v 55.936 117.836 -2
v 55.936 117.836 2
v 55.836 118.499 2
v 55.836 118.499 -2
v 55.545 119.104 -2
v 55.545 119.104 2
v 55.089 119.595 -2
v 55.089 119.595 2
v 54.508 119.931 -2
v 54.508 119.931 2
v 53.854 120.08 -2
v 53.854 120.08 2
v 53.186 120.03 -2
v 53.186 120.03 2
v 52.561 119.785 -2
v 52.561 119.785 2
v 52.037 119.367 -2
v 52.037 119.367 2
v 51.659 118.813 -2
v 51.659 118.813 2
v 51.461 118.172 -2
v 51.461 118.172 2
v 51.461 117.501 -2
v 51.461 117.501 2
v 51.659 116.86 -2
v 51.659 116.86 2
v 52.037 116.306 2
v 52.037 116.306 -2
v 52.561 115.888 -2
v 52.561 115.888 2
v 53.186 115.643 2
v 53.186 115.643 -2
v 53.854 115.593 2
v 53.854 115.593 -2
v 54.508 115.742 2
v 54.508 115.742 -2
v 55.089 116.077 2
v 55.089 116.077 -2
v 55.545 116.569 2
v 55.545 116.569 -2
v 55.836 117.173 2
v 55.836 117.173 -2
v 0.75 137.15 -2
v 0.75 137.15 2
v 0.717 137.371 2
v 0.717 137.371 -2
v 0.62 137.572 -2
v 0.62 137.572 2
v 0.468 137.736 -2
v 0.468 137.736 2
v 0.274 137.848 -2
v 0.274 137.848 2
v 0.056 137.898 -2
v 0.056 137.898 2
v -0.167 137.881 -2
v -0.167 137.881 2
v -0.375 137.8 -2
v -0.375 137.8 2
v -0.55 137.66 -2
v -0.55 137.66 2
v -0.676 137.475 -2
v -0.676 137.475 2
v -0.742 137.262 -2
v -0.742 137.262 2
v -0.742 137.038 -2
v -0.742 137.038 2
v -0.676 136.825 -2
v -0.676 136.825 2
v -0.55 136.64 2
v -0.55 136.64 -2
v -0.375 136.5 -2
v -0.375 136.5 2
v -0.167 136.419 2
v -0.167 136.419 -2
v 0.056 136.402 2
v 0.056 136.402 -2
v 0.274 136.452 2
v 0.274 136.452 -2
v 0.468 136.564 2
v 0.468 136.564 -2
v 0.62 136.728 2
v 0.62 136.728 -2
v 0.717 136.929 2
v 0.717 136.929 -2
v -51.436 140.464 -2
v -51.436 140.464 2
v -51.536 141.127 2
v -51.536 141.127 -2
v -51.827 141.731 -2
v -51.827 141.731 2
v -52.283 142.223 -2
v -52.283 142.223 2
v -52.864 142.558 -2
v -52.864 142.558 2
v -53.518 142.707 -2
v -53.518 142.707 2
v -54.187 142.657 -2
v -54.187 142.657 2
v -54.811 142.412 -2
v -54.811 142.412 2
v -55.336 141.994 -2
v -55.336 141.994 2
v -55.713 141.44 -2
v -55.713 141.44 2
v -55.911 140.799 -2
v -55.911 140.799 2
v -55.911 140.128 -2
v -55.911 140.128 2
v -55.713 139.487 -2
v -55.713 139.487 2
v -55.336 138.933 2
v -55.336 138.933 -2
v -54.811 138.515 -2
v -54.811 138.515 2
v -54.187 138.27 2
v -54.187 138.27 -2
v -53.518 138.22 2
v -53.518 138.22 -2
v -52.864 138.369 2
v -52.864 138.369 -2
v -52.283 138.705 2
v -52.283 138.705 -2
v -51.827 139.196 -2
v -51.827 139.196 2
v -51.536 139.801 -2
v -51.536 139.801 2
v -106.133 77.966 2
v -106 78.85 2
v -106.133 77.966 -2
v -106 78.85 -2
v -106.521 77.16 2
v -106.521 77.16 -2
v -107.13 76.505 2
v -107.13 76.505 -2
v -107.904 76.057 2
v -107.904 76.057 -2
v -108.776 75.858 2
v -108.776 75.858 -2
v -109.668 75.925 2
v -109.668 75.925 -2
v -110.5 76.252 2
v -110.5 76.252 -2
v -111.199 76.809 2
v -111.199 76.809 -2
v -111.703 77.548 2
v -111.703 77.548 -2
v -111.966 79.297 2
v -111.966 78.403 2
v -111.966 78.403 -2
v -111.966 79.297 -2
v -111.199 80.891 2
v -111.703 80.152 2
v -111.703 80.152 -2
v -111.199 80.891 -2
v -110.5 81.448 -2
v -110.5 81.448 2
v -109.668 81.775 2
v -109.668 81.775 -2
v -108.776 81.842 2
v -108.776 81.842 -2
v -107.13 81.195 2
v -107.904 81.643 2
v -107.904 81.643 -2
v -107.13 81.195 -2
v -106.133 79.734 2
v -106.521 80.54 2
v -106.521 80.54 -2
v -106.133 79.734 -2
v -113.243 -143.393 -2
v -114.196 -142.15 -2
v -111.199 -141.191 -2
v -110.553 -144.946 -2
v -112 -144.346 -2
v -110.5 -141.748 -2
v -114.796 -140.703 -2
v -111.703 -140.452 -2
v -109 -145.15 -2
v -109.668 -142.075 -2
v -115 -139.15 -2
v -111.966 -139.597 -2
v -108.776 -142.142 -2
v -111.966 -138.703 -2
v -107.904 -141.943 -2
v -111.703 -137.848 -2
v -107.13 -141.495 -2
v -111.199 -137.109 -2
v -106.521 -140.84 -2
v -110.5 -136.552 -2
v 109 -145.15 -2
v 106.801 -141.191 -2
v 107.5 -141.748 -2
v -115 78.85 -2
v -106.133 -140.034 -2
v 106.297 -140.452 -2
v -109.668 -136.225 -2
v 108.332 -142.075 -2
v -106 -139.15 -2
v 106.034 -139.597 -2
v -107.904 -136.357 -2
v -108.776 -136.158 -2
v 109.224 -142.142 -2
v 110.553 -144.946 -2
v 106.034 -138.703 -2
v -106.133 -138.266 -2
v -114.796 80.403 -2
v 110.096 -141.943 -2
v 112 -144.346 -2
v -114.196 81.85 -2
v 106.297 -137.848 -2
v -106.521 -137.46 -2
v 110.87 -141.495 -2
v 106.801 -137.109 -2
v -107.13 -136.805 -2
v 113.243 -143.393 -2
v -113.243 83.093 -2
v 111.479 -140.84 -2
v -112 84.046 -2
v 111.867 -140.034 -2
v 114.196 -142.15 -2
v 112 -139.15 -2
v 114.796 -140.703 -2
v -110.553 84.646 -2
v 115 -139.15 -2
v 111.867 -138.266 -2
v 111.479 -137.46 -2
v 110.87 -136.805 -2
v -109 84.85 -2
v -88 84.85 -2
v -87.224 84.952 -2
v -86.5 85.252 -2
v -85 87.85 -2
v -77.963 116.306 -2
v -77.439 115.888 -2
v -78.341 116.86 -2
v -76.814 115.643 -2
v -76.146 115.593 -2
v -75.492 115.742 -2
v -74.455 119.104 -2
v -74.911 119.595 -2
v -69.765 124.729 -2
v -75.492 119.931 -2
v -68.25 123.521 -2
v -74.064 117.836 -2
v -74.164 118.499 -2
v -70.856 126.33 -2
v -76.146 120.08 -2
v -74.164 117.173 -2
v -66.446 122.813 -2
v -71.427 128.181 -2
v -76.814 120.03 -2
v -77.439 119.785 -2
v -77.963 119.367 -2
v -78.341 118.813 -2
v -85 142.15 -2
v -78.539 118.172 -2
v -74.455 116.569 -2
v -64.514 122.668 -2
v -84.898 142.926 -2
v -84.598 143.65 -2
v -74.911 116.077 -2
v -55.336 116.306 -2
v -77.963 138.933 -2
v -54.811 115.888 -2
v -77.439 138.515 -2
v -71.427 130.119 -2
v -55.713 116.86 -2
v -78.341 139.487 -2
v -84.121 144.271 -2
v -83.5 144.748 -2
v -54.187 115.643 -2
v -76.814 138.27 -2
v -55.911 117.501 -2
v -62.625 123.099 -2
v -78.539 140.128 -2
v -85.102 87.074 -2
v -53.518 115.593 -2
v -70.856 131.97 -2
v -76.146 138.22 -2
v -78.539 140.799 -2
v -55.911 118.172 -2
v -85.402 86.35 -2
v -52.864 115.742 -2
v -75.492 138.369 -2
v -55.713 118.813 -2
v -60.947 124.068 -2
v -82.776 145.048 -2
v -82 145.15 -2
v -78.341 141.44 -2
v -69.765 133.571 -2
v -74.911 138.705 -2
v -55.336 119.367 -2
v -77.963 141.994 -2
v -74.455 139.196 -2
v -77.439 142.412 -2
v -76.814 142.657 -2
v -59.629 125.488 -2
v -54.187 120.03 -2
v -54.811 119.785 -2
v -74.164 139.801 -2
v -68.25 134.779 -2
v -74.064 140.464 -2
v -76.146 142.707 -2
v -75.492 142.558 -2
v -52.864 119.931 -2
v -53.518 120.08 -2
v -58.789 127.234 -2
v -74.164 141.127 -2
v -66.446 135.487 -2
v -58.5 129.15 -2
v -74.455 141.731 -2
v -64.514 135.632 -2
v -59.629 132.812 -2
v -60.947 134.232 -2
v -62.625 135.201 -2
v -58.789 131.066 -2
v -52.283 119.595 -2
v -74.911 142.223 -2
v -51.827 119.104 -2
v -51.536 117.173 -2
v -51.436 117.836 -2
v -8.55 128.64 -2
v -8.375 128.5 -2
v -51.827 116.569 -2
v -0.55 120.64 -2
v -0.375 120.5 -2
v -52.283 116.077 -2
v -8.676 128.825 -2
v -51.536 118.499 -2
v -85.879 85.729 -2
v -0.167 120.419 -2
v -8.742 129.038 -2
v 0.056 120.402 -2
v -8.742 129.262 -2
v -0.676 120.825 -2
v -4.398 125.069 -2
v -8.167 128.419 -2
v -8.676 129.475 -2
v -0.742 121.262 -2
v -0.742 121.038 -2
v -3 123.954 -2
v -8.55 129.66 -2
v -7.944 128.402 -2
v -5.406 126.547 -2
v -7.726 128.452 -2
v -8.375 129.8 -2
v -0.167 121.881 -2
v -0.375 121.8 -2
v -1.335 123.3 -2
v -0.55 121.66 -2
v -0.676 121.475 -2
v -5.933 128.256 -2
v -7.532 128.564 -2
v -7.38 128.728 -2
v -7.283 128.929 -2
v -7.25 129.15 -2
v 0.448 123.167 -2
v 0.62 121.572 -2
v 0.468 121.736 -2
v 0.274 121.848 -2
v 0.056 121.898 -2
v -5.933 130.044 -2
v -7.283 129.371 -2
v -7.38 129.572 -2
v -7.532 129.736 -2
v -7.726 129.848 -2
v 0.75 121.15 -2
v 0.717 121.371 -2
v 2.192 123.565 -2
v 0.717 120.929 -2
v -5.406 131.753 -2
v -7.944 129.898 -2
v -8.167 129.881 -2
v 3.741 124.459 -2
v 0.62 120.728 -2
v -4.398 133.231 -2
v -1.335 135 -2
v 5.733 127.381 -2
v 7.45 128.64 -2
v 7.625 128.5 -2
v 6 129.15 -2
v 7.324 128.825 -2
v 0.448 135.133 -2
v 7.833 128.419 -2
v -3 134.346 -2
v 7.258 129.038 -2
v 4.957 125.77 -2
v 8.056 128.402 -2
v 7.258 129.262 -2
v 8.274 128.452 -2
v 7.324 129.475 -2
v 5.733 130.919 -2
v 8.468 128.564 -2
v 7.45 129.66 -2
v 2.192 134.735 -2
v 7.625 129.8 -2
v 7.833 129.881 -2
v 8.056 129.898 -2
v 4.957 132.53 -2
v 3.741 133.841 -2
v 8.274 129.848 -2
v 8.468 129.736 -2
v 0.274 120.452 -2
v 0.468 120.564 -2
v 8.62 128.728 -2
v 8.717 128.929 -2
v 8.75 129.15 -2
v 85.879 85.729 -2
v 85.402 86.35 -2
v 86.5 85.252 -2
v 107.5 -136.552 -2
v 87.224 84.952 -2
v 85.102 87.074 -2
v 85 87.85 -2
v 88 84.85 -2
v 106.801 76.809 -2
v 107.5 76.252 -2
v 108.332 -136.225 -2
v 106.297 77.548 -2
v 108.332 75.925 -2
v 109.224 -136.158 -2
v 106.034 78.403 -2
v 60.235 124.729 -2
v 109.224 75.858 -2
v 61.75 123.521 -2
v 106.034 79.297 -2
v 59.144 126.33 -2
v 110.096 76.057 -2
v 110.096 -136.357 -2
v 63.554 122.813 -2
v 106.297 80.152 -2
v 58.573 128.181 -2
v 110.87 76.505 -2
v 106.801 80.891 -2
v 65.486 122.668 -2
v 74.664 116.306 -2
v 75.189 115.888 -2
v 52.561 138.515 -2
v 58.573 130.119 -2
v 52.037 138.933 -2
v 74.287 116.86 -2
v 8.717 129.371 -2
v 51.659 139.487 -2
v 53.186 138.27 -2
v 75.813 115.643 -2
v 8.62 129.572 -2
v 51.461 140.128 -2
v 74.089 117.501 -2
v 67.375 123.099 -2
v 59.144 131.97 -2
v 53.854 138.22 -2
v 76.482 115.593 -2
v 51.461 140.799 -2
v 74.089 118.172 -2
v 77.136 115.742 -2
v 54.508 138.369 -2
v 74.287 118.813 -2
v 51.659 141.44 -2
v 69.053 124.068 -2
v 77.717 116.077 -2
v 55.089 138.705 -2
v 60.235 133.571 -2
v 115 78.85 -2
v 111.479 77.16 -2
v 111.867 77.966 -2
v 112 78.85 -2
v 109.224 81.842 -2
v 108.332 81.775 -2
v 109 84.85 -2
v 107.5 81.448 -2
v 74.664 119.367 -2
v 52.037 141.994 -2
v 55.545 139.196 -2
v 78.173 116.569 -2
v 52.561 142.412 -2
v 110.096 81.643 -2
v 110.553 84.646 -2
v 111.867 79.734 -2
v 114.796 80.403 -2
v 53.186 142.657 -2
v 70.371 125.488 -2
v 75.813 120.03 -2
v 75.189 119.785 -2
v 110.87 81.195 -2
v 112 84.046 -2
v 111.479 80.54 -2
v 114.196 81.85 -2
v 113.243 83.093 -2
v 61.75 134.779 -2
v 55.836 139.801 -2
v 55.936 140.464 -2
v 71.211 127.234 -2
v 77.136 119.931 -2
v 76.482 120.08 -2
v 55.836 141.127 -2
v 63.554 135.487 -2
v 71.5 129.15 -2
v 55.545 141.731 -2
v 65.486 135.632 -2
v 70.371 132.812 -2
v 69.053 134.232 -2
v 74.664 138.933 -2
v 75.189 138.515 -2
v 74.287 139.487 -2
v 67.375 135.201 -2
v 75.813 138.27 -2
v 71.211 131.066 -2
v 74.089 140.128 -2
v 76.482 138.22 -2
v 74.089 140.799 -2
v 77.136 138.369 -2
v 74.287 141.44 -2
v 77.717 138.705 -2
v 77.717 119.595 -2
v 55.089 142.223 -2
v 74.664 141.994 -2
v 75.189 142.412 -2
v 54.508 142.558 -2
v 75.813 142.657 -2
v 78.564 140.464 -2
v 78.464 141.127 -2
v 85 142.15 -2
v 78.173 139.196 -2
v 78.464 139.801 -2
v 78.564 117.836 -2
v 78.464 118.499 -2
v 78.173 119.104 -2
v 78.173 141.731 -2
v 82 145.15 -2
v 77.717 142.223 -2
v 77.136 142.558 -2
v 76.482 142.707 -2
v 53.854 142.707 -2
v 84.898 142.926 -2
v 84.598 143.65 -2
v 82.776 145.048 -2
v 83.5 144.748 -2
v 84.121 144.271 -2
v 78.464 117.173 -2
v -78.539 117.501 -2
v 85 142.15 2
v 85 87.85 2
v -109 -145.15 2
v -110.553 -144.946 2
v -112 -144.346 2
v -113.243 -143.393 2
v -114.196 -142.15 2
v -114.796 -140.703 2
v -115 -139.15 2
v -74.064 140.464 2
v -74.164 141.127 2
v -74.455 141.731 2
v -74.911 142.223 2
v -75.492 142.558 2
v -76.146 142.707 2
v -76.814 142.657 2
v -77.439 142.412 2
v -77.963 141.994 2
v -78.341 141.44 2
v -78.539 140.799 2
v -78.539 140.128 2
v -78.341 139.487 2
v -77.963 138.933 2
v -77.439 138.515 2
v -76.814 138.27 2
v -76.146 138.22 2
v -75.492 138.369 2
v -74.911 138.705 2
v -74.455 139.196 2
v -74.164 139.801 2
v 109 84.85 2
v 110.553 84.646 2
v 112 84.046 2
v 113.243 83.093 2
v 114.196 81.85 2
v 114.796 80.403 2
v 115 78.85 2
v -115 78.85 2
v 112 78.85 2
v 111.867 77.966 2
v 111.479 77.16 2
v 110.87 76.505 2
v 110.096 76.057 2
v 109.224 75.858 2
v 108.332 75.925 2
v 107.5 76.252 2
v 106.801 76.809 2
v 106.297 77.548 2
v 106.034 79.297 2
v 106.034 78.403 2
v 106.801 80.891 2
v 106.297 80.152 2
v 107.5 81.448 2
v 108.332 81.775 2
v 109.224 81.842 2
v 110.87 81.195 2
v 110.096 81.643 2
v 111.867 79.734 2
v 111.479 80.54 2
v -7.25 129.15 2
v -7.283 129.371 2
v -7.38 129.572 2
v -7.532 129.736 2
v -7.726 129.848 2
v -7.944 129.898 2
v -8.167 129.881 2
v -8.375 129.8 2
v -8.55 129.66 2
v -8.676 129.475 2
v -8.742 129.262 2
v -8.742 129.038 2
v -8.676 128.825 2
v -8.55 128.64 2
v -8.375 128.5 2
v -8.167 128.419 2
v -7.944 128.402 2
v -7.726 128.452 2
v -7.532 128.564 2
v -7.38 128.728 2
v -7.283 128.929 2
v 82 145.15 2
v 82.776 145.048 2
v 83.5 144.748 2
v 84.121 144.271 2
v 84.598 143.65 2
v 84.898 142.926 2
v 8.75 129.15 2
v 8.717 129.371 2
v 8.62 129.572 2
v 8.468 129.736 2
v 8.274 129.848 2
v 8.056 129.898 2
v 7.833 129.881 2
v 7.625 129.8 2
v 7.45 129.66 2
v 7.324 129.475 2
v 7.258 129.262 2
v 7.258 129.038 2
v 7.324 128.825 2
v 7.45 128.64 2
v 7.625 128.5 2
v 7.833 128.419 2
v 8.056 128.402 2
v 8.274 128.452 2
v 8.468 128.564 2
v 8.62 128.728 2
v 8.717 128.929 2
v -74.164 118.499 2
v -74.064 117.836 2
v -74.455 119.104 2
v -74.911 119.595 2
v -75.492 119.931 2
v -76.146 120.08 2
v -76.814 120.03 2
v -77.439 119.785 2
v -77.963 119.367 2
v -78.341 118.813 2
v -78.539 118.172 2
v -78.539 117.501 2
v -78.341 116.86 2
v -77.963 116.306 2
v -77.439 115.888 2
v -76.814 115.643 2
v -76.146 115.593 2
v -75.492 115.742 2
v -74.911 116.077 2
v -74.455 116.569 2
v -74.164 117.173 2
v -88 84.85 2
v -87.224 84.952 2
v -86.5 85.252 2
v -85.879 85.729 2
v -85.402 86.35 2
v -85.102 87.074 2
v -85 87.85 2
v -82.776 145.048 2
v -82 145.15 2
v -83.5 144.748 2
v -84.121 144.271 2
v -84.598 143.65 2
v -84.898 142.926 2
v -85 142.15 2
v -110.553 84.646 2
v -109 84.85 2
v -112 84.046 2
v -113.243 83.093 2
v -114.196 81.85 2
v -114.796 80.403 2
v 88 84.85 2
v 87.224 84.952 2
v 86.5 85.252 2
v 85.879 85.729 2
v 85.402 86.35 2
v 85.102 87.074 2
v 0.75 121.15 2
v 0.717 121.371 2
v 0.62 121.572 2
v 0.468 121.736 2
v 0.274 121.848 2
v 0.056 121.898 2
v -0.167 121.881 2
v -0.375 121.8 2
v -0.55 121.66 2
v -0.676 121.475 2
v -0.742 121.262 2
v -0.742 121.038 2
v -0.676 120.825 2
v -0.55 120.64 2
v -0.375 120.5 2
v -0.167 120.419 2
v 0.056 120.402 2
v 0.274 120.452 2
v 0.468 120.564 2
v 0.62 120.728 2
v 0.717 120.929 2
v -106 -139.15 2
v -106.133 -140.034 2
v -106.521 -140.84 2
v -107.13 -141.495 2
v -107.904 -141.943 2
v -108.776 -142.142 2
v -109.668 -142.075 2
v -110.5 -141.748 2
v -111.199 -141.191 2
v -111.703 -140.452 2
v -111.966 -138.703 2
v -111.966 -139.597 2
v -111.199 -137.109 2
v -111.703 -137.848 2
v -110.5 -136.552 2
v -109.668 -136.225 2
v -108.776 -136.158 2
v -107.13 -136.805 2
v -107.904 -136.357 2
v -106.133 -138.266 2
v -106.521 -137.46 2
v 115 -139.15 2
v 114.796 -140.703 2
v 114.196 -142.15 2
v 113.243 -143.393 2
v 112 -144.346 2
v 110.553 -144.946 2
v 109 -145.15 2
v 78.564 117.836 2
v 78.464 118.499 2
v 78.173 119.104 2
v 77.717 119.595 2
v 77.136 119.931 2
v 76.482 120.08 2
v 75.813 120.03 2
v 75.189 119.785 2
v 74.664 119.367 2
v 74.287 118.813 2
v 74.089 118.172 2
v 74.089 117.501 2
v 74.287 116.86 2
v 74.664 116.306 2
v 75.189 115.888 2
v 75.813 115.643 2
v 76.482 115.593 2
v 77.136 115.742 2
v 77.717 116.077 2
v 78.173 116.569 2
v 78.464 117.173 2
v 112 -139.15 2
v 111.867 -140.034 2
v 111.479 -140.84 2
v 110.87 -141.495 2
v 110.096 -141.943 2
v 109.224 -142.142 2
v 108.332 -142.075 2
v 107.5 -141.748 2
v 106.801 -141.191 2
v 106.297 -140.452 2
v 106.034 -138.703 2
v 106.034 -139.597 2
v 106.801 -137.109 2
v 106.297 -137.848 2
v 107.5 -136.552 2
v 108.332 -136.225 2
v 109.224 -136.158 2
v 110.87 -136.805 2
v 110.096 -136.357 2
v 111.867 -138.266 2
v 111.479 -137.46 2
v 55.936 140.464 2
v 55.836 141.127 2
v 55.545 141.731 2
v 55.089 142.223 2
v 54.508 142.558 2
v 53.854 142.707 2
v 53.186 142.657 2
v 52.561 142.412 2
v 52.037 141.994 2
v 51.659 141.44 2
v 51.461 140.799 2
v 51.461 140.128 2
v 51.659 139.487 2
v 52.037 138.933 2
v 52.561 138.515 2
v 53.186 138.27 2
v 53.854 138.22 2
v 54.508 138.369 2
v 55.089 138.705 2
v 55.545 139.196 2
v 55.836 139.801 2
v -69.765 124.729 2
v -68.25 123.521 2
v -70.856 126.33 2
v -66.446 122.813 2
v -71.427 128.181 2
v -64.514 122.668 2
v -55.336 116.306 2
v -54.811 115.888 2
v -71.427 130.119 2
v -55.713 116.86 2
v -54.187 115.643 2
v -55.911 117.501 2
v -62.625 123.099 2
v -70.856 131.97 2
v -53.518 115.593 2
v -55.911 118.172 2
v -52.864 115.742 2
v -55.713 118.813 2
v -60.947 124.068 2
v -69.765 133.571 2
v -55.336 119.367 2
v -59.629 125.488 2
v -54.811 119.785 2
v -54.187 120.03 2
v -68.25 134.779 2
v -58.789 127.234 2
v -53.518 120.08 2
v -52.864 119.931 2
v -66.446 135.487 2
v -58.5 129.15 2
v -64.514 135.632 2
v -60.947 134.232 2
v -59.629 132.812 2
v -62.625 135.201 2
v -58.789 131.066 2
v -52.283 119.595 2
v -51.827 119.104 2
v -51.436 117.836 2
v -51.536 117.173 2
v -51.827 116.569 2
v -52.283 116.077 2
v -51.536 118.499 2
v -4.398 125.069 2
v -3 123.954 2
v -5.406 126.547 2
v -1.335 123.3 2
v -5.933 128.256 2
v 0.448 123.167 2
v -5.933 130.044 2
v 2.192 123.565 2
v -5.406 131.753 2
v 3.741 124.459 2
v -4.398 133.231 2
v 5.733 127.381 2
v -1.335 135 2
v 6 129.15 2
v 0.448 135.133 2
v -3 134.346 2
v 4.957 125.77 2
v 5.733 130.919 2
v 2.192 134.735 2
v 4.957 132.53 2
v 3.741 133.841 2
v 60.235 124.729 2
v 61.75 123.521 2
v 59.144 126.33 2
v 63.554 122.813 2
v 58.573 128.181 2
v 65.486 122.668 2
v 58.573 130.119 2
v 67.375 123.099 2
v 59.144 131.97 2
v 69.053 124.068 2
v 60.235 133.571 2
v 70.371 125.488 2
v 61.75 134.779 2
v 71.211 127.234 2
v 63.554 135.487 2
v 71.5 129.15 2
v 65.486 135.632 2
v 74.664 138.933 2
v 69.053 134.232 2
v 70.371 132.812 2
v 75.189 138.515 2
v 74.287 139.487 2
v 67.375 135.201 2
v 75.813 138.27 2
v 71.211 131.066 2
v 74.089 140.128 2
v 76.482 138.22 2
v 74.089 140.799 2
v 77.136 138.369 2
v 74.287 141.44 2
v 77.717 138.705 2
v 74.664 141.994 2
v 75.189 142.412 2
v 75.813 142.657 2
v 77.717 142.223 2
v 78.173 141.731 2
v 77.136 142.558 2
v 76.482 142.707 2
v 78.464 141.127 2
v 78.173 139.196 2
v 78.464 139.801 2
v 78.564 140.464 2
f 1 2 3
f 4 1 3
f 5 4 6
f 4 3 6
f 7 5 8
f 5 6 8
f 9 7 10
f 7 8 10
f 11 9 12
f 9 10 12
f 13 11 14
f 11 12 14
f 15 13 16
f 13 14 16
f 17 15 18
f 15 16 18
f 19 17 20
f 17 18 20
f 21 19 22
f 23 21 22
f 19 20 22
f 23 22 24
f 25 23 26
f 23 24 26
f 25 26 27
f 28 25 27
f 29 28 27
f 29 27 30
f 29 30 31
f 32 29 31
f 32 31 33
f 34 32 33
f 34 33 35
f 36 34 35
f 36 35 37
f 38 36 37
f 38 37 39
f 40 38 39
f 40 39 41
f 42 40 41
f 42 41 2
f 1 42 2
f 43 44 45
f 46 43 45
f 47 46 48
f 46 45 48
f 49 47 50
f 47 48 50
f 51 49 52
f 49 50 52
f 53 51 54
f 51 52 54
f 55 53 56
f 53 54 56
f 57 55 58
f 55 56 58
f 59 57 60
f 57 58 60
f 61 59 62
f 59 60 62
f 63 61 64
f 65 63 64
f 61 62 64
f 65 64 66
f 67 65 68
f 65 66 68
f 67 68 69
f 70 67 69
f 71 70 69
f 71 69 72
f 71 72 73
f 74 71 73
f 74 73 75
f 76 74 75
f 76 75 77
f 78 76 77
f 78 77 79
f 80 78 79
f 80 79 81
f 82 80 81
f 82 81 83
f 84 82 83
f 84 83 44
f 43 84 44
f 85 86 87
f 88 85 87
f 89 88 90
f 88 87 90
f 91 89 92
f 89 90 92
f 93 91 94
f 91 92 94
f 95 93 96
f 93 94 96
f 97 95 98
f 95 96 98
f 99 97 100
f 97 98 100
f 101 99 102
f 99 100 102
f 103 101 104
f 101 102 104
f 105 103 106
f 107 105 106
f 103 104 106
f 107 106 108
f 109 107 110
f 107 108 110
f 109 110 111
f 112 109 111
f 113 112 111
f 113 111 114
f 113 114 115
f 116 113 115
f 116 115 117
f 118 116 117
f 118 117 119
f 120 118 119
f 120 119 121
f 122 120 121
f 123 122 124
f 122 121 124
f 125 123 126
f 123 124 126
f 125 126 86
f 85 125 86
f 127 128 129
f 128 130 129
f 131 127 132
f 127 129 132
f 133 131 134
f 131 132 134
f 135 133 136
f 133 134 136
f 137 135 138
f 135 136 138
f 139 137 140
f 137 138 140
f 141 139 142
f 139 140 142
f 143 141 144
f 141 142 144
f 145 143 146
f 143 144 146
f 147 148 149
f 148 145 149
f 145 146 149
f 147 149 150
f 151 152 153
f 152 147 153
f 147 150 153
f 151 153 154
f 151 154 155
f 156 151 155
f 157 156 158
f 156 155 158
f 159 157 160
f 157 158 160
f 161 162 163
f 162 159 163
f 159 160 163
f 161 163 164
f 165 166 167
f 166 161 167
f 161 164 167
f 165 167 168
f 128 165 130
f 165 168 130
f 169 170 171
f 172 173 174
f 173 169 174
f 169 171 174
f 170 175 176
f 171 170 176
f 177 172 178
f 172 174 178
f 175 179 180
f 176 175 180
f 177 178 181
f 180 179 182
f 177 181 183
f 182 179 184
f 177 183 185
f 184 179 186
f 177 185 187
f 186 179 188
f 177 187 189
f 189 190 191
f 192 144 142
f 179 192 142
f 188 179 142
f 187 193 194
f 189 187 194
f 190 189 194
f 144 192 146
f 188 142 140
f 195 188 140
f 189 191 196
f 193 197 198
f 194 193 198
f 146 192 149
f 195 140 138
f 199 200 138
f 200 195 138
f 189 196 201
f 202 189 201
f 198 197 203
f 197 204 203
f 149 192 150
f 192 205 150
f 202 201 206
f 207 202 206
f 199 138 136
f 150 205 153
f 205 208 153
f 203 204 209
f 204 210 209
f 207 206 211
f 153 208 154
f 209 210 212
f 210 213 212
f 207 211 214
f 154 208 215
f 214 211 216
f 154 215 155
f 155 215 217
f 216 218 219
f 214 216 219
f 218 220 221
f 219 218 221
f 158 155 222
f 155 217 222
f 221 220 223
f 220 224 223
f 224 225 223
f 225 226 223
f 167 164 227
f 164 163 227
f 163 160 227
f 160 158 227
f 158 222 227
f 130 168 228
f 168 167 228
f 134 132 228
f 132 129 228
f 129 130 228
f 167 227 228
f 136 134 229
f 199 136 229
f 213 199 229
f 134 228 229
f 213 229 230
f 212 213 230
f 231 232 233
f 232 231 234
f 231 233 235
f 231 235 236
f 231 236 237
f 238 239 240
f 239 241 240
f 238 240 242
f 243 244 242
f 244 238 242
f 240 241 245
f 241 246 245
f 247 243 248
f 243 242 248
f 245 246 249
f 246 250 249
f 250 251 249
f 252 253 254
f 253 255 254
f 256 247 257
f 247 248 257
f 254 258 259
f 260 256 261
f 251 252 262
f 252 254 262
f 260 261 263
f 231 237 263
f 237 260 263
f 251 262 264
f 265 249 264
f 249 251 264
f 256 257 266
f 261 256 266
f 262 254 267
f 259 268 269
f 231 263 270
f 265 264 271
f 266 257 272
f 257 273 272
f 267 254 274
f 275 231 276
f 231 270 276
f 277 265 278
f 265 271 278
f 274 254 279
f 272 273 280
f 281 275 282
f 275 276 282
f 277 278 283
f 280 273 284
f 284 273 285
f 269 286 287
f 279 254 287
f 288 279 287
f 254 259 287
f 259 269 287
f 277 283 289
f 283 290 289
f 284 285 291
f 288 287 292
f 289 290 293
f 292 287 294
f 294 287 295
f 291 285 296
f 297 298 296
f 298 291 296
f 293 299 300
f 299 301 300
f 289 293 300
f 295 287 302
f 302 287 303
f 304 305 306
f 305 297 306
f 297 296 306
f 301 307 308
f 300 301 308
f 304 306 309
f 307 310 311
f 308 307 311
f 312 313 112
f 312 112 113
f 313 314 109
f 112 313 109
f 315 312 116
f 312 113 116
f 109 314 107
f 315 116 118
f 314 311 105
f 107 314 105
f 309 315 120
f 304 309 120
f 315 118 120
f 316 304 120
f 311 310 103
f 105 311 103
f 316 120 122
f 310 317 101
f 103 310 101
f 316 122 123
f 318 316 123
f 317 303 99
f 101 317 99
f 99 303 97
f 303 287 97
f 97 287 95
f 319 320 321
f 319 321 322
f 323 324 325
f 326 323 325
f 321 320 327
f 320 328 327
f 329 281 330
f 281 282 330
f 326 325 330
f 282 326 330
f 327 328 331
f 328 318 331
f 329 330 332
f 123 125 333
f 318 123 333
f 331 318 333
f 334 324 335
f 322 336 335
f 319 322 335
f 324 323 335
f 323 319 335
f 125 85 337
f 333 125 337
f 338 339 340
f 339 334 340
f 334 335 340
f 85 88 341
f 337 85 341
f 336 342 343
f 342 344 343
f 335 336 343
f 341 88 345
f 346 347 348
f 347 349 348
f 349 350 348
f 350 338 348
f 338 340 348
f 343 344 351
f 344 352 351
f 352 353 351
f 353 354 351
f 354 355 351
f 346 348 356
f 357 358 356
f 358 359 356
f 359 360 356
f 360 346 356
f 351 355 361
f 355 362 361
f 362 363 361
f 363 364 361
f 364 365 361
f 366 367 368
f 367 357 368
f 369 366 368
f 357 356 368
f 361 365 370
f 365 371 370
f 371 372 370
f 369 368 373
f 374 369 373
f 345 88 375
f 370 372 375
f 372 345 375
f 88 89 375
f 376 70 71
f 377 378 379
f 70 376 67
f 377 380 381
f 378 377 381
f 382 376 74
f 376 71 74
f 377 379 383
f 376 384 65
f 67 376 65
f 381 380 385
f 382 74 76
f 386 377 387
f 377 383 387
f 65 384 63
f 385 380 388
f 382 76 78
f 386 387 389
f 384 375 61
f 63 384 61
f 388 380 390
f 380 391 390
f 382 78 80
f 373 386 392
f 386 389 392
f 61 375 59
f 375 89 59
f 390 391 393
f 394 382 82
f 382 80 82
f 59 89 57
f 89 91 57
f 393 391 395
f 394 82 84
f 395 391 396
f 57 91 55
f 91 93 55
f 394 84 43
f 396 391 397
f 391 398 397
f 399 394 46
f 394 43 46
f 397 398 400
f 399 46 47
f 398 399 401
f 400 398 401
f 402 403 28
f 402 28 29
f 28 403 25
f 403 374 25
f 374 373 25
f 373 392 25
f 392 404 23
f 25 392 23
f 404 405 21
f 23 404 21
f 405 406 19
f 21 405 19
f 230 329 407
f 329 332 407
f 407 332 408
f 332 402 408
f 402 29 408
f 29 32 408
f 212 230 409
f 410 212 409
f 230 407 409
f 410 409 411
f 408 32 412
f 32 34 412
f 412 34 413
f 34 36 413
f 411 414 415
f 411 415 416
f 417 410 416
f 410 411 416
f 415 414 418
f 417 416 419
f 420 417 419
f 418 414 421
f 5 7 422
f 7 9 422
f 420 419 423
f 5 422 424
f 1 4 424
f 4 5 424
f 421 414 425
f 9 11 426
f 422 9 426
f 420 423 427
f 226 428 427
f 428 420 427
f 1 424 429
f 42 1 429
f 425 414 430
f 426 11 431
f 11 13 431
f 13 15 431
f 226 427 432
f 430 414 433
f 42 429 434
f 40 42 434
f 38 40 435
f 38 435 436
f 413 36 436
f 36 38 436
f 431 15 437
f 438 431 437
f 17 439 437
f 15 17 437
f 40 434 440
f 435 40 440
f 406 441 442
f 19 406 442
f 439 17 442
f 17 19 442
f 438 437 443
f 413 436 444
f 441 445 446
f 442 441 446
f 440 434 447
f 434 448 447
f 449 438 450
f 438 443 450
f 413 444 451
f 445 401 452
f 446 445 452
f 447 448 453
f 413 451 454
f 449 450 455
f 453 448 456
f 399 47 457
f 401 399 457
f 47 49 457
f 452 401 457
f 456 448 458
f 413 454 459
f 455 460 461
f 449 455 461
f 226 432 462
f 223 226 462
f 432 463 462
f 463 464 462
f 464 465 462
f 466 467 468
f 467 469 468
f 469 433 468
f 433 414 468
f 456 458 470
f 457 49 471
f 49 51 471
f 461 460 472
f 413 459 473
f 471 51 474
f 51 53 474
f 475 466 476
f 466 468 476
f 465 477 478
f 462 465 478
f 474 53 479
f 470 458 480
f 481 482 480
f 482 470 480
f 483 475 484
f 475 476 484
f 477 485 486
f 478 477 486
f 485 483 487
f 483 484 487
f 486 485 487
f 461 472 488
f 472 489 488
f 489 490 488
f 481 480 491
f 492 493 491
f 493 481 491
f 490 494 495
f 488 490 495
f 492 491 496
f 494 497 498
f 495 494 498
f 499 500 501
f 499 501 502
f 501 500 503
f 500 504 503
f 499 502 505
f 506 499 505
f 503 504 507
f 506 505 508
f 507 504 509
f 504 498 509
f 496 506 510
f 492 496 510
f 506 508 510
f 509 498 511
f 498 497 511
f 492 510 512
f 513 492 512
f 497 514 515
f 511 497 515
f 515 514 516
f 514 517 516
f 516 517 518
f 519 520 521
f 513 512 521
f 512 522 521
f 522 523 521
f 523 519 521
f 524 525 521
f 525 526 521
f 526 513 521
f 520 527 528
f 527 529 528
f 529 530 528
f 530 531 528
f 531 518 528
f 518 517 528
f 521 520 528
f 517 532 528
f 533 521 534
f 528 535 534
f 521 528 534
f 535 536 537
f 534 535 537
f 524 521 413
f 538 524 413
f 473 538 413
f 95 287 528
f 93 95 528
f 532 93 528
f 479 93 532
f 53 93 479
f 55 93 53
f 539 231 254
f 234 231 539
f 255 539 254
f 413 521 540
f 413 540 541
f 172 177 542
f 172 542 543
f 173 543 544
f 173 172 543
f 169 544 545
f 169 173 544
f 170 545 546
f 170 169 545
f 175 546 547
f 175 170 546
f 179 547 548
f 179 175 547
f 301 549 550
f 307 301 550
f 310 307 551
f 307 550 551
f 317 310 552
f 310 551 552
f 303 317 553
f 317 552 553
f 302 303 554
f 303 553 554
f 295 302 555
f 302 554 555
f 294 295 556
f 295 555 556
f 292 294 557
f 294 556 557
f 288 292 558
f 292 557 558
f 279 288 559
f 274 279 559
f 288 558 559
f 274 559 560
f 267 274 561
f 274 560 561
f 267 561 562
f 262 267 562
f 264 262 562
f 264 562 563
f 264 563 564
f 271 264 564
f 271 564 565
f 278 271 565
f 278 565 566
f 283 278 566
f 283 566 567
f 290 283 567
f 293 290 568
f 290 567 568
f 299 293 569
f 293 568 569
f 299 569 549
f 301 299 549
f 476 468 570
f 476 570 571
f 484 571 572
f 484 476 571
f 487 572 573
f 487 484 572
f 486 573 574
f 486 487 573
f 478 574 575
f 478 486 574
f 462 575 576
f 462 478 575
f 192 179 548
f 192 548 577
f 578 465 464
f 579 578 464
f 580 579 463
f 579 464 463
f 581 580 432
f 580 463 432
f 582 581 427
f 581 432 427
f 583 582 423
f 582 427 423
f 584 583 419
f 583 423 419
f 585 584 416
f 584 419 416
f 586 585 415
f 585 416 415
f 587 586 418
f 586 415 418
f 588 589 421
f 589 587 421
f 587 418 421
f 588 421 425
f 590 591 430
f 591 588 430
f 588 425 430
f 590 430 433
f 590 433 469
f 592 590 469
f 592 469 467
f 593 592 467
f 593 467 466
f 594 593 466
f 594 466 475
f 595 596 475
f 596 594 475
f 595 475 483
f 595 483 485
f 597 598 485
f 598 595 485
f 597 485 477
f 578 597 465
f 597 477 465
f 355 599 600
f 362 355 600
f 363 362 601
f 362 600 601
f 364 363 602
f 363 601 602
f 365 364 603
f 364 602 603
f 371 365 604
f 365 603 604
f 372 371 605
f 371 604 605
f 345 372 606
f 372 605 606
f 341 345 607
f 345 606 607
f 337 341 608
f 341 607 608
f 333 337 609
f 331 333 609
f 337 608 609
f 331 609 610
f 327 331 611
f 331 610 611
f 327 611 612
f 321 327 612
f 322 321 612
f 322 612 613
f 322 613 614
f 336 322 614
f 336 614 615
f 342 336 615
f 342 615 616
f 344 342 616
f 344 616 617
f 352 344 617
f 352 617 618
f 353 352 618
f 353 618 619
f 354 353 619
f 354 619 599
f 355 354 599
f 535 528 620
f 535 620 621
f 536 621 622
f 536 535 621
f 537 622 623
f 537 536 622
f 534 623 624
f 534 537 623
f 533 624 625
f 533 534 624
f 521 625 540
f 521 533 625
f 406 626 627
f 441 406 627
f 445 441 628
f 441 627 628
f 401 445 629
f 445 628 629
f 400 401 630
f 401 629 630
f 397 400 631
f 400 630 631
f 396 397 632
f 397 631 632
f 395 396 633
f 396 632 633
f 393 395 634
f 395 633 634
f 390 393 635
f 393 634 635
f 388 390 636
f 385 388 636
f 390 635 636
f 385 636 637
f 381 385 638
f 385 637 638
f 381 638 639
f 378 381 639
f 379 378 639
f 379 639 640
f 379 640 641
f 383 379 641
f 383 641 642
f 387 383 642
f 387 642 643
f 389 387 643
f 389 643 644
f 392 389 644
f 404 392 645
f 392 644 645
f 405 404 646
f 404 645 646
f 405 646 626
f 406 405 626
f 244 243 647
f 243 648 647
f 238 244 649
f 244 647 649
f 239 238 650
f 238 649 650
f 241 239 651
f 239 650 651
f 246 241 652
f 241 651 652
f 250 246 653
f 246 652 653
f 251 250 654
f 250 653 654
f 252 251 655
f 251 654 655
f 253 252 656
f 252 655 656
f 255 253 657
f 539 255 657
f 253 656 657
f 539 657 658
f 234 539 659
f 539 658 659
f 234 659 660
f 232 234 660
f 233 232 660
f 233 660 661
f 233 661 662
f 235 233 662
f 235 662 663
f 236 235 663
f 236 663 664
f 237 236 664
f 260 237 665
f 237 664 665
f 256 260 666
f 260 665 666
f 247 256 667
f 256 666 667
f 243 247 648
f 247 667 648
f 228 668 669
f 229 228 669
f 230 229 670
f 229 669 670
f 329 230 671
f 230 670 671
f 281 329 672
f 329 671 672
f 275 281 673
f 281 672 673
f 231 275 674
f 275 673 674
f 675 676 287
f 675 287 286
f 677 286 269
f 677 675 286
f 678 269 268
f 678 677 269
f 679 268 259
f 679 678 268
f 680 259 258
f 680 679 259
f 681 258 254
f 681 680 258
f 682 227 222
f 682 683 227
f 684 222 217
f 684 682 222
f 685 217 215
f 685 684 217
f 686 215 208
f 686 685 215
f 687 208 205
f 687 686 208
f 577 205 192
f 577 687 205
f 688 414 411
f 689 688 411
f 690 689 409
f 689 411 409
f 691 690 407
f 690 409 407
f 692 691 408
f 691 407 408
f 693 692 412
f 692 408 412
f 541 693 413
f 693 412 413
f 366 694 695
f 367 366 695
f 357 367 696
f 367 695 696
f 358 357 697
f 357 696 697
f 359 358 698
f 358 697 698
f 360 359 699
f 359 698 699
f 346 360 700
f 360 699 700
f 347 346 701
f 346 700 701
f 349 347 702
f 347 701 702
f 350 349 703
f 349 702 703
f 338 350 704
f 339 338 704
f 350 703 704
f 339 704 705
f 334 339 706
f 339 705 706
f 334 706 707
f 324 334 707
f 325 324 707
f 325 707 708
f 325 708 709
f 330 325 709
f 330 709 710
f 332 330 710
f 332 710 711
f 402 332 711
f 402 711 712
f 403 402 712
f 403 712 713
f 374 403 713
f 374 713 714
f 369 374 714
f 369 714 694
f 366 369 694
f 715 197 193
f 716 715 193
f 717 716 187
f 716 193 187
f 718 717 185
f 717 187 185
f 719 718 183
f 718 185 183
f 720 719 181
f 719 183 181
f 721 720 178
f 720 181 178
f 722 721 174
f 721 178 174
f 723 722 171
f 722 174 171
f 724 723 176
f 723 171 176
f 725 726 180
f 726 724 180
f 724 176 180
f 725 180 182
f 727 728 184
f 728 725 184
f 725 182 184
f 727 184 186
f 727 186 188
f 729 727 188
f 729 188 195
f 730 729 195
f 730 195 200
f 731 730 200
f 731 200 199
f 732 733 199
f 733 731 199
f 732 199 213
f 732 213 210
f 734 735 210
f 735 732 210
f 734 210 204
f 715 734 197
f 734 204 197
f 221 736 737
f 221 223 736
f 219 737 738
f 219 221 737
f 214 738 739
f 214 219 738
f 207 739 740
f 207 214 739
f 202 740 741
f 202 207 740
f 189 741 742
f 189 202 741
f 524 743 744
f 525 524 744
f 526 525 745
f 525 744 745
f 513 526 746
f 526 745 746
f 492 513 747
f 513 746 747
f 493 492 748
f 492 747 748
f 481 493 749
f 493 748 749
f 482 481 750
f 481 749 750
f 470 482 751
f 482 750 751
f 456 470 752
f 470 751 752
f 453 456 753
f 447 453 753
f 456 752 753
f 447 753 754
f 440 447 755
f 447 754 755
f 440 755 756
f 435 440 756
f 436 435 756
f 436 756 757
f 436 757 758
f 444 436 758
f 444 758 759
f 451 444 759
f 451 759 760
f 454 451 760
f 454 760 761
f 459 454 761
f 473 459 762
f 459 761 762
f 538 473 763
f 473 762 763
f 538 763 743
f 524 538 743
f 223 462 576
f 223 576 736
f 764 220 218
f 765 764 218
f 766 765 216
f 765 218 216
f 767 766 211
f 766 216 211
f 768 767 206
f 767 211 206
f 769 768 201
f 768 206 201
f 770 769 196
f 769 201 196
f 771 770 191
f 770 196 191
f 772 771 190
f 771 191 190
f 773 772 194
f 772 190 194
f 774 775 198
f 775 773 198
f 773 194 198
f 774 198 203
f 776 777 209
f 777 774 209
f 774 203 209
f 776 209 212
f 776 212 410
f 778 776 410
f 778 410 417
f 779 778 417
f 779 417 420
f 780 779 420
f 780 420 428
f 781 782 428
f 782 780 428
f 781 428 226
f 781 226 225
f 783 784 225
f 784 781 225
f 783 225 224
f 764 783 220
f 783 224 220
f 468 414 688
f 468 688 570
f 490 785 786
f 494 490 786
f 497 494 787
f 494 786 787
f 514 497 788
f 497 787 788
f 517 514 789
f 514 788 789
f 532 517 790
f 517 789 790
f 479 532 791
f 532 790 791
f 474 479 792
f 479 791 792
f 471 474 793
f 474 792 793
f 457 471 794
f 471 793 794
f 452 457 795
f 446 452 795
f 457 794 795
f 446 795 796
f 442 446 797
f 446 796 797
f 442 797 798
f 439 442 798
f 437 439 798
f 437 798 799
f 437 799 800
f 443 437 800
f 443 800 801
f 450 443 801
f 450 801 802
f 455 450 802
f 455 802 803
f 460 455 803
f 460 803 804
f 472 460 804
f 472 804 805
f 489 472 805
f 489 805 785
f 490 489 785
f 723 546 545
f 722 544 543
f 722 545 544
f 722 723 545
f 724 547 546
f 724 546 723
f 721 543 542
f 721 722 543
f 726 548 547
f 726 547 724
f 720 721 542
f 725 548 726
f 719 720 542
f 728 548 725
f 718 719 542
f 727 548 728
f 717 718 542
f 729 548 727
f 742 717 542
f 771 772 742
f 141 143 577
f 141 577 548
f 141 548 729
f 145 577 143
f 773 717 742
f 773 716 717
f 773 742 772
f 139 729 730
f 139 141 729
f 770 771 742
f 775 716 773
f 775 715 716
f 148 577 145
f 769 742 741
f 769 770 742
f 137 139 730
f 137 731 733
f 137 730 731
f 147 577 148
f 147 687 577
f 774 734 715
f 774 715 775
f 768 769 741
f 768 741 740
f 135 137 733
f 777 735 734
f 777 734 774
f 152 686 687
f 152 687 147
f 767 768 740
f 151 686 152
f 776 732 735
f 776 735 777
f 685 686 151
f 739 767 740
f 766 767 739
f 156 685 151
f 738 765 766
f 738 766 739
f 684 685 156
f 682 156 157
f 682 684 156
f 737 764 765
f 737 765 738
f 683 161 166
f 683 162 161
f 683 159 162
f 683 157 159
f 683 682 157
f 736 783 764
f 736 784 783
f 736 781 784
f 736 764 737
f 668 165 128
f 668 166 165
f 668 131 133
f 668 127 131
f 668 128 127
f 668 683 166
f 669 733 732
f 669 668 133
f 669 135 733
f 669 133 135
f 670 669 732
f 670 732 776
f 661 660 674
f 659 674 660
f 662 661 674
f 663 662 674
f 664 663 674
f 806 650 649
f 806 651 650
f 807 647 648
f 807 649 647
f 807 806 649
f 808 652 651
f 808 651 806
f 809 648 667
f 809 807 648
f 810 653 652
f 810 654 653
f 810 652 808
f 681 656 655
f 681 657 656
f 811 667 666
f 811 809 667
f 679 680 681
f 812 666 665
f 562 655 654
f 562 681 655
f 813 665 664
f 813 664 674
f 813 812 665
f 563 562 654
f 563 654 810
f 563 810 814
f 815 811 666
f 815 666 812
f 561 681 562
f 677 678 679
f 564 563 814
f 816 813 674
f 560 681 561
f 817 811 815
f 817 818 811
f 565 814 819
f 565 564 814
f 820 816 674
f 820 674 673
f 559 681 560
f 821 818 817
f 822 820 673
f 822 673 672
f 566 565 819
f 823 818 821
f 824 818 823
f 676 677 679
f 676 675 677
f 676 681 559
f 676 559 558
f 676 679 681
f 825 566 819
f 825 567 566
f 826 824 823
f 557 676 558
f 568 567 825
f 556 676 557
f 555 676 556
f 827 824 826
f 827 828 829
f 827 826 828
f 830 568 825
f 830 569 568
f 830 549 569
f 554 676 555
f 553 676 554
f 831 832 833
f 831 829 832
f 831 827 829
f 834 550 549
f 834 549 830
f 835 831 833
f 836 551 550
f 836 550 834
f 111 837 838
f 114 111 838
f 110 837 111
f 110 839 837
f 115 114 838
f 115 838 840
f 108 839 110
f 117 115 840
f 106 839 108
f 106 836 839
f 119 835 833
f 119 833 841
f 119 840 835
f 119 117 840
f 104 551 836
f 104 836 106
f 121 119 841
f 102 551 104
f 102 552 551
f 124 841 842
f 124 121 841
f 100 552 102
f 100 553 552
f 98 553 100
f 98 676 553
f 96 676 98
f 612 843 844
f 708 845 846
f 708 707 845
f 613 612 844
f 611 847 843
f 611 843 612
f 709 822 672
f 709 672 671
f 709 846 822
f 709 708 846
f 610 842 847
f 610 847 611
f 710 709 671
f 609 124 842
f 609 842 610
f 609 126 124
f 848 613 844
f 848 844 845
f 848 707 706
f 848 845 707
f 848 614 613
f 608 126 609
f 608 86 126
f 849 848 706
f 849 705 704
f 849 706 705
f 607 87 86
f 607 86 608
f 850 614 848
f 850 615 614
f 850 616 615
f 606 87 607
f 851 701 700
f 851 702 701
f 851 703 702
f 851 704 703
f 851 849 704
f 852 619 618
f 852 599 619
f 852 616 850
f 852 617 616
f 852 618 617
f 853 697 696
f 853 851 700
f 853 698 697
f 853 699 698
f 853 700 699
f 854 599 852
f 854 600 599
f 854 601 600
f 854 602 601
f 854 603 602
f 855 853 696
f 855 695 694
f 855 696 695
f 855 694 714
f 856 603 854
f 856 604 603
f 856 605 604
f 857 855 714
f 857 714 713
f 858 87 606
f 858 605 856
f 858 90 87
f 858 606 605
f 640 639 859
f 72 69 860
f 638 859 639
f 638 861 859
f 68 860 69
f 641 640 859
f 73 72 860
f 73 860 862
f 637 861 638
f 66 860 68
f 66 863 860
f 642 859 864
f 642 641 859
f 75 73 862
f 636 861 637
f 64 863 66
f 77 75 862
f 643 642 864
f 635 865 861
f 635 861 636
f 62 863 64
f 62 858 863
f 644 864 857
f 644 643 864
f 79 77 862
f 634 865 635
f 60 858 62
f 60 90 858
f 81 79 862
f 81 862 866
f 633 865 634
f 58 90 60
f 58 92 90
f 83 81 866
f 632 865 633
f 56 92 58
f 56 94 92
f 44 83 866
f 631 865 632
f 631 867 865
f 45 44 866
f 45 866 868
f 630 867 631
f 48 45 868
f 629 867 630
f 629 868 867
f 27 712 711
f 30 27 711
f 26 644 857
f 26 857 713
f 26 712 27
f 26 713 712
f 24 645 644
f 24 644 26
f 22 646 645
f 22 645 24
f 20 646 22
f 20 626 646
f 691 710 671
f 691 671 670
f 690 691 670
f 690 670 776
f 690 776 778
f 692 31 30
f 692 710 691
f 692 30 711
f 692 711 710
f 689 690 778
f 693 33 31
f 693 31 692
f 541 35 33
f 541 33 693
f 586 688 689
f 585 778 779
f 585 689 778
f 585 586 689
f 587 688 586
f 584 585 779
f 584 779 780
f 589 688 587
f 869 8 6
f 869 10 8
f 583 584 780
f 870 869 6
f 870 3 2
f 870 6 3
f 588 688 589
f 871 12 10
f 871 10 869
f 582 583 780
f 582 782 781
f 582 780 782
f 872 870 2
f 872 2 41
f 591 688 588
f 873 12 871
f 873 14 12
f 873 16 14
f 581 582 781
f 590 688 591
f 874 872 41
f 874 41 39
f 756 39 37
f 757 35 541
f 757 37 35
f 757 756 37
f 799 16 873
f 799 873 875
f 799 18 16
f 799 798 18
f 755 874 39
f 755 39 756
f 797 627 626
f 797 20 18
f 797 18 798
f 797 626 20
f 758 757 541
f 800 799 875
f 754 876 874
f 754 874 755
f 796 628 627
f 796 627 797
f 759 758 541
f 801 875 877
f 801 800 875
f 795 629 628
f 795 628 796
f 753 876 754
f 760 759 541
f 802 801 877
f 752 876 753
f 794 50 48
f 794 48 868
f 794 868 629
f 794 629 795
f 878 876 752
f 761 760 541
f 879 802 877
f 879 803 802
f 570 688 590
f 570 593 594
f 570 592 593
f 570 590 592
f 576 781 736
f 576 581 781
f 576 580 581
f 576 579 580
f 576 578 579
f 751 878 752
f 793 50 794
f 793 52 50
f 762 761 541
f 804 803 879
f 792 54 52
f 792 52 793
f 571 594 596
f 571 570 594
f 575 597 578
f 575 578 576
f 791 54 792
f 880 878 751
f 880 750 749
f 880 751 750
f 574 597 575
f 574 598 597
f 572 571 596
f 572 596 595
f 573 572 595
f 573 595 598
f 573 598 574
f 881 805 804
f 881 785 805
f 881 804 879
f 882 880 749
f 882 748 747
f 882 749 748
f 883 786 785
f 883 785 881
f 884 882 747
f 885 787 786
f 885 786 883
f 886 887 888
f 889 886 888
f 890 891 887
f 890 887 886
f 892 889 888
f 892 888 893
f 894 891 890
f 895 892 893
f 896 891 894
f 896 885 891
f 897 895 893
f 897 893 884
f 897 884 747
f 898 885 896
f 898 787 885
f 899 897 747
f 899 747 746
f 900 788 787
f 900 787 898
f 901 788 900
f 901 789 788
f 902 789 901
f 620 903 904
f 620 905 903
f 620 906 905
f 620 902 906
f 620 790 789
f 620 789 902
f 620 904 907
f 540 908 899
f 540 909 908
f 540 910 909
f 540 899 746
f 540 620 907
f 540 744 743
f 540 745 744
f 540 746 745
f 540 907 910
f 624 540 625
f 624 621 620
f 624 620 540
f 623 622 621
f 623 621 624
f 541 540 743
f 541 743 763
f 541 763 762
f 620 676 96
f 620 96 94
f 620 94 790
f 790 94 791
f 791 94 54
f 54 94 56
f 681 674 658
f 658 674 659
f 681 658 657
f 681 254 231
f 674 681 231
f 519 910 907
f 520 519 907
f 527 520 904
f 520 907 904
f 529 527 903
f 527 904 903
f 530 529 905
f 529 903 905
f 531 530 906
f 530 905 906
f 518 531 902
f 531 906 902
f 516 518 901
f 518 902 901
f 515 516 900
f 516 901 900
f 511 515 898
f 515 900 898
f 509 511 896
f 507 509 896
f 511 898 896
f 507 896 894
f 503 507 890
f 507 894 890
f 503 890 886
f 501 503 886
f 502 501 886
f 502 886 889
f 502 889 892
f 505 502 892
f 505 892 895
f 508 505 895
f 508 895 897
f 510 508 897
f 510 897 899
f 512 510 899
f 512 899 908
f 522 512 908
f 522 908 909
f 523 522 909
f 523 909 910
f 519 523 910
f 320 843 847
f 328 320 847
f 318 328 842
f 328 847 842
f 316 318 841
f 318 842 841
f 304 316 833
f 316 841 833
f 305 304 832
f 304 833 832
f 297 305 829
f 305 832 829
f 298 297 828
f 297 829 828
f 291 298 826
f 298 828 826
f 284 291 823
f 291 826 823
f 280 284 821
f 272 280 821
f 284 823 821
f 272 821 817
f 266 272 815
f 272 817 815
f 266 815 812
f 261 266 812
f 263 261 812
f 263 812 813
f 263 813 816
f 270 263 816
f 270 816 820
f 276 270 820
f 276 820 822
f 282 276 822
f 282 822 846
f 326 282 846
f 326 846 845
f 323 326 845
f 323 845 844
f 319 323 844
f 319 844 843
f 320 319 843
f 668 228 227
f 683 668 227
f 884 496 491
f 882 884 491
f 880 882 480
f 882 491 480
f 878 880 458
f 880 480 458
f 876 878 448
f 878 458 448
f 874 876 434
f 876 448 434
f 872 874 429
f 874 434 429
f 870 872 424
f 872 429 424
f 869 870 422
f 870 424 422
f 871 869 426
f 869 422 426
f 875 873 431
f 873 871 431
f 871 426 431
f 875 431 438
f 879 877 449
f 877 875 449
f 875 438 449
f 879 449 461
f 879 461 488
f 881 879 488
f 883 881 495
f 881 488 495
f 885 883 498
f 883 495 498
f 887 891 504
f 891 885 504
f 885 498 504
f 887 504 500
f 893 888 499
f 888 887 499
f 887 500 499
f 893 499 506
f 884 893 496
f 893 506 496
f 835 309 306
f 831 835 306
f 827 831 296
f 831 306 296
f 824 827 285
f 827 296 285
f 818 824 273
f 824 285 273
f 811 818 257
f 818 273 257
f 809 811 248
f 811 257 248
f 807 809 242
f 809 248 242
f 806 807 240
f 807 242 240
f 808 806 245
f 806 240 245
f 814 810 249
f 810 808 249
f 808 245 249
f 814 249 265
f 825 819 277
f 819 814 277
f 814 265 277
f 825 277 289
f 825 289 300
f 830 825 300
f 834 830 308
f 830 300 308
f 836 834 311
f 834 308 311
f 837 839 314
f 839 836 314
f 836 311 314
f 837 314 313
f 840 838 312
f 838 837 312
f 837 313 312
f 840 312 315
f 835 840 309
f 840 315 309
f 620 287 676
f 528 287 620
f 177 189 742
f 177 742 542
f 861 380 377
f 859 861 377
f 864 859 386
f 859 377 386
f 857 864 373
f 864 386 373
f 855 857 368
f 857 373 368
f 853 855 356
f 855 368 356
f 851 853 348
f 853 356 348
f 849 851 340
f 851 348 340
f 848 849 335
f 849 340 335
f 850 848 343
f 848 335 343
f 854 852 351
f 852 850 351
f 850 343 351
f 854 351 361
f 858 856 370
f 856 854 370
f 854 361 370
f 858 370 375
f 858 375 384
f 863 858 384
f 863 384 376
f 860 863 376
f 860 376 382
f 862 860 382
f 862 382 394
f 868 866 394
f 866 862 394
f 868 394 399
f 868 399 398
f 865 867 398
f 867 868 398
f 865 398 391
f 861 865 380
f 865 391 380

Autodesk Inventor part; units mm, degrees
ref_plane "YZ Plane" through (0, 0, 0) normal (1, 0, 0) x (0, 1, 0)
ref_plane "XZ Plane" through (0, 0, 0) normal (0, 1, 0) x (-1, 0, 0)
ref_plane "XY Plane" through (0, 0, 0) normal (0, 0, 1) x (1, 0, 0)
sketch "Sketch1" plane through (0, 0, 0) normal (0, 0, 1) x (1, 0, 0)
  line L0 (-115, 145.15) -> (115, 145.15)
  line L1 (115, 145.15) -> (115, -145.15)
  line L2 (115, -145.15) -> (-115, -145.15)
  line L3 (-115, -145.15) -> (-115, 145.15)
  line L4 (-115, 145.15) -> (-85, 145.15)
  line L5 (-85, 145.15) -> (-85, 84.85)
  line L6 (-85, 84.85) -> (-115, 84.85)
  line L7 (-115, 84.85) -> (-115, 145.15)
  line L8 (115, 145.15) -> (85, 145.15)
  line L9 (85, 145.15) -> (85, 84.85)
  line L10 (85, 84.85) -> (115, 84.85)
  line L11 (115, 84.85) -> (115, 145.15)
  circle A0 centre (-65, 129.15) radius 6.5
  circle A1 centre (65, 129.15) radius 6.5
  circle A2 centre (0, 129.15) radius 6
  line L12 (65, 129.15) -> (-65, 129.15) construction
  circle A3 centre (-109, 78.85) radius 3
  circle A4 centre (109, 78.85) radius 3
  circle A5 centre (109, -139.15) radius 3
  circle A6 centre (-109, -139.15) radius 3
  line L13 (109, -139.15) -> (-109, -139.15) construction
  line L14 (109, -139.15) -> (109, 78.85) construction
  line L15 (-109, 78.85) -> (-109, -139.15) construction
  line L16 (109, 78.85) -> (-109, 78.85) construction
  point P0 (0, 0)
  dimension "d0" = 290.3
  dimension "d1" = 230
  dimension "d2" = 30
  dimension "d3" = 30
  dimension "d4" = 60.3
  dimension "d5" = 13
  dimension "d6" = 13
  dimension "d7" = 12
  dimension "d8" = 130
  dimension "d9" = 65
  dimension "d10" = 16
  dimension "d11" = 6
  dimension "d12" = 6
  dimension "d13" = 6
  dimension "d14" = 6
  dimension "d15" = 218
  dimension "d16" = 218
  dimension "d17" = 218
  dimension "d18" = 218
  dimension "d19" = 115
  dimension "d20" = 145.15
  dimension "d21" = 6
  dimension "d22" = 6
extrude "Tykkelse" add sketch "Sketch1" along normal mid plane 4 contours L0 L9 L10 L1 L2 L3 L6 L5
fillet "Fillet1" radius 6 4 edges at (115, -145.15, 0) (-115, -145.15, 0) (-115, 84.85, 0) (115, 84.85, 0)
fillet "Fillet2" radius 3 4 edges at (-85, 84.85, 0) (-85, 145.15, 0) (85, 84.85, 0) (85, 145.15, 0)
sketch "Sketch2" plane through (0, 0, 2) normal (0, 0, 1) x (1, 0, 0)
  line L0 (78, 145.15) -> (81, 142.15) projected
  line L1 (78, 145.15) -> (52, 145.15) projected
  line L2 (49, 142.15) -> (52, 145.15) projected
  line L3 (49, 142.15) -> (49, 116.15) projected
  line L4 (52, 113.15) -> (49, 116.15) projected
  line L5 (52, 113.15) -> (78, 113.15) projected
  line L6 (81, 116.15) -> (78, 113.15) projected
  line L7 (81, 116.15) -> (81, 142.15) projected
  circle A0 centre (53.6863, 140.4637) radius 2.25 projected
  circle A1 centre (53.6863, 117.8363) radius 2.25 projected
  circle A2 centre (76.3137, 140.4637) radius 2.25 projected
  circle A3 centre (76.3137, 117.8363) radius 2.25 projected
  circle A4 centre (65, 129.15) radius 10.5 projected
  line L8 (-81, 142.15) -> (-78, 145.15) projected
  line L9 (-81, 142.15) -> (-81, 116.15) projected
  line L10 (-78, 113.15) -> (-81, 116.15) projected
  line L11 (-78, 113.15) -> (-52, 113.15) projected
  line L12 (-49, 116.15) -> (-52, 113.15) projected
  line L13 (-49, 116.15) -> (-49, 142.15) projected
  line L14 (-52, 145.15) -> (-49, 142.15) projected
  line L15 (-52, 145.15) -> (-78, 145.15) projected
  circle A5 centre (-76.3137, 117.8363) radius 2.25 projected
  circle A6 centre (-53.6863, 117.8363) radius 2.25 projected
  circle A7 centre (-76.3137, 140.4637) radius 2.25 projected
  circle A8 centre (-53.6863, 140.4637) radius 2.25 projected
  circle A9 centre (-65, 129.15) radius 10.5 projected
  point P0 (0, 0)
extrude "Flange-huller" cut sketch "Sketch2" against normal blind 10 contours A0 | A1 | A2 | A3 | A5 | A6 | A7 | A8
sketch "Sketch3" plane through (0, 0, 2) normal (0, 0, 1) x (1, 0, 0)
  circle A0 centre (0, 129.15) radius 4 construction
  circle A1 centre (0, 121.15) radius 0.75
  circle A2 centre (0, 137.15) radius 0.75
  circle A3 centre (-8, 129.15) radius 0.75
  circle A4 centre (8, 129.15) radius 0.75
  line L0 (0, 137.15) -> (0, 121.15) construction
  line L1 (-8, 129.15) -> (8, 129.15) construction
  circle A5 centre (7.954, 128.2933) radius 0.9464 construction
  circle A6 centre (0, 129.15) radius 8 construction
  point P0 (0, 0)
  dimension "d29" = 1.5
extrude "Flange møtrik" cut sketch "Sketch3" against normal blind 10
equation "\"d3\" = d2"
equation "\"d6\" = d5"
equation "\"d9\" = 0.5 * d8"
equation "\"d12\" = d11"
equation "\"d13\" = d11"
equation "\"d14\" = d11"
equation "\"d19\" = 0.5 * d1"
equation "\"d20\" = 0.5 * d0"
properties part number "Byggeplade Holder mk2"
